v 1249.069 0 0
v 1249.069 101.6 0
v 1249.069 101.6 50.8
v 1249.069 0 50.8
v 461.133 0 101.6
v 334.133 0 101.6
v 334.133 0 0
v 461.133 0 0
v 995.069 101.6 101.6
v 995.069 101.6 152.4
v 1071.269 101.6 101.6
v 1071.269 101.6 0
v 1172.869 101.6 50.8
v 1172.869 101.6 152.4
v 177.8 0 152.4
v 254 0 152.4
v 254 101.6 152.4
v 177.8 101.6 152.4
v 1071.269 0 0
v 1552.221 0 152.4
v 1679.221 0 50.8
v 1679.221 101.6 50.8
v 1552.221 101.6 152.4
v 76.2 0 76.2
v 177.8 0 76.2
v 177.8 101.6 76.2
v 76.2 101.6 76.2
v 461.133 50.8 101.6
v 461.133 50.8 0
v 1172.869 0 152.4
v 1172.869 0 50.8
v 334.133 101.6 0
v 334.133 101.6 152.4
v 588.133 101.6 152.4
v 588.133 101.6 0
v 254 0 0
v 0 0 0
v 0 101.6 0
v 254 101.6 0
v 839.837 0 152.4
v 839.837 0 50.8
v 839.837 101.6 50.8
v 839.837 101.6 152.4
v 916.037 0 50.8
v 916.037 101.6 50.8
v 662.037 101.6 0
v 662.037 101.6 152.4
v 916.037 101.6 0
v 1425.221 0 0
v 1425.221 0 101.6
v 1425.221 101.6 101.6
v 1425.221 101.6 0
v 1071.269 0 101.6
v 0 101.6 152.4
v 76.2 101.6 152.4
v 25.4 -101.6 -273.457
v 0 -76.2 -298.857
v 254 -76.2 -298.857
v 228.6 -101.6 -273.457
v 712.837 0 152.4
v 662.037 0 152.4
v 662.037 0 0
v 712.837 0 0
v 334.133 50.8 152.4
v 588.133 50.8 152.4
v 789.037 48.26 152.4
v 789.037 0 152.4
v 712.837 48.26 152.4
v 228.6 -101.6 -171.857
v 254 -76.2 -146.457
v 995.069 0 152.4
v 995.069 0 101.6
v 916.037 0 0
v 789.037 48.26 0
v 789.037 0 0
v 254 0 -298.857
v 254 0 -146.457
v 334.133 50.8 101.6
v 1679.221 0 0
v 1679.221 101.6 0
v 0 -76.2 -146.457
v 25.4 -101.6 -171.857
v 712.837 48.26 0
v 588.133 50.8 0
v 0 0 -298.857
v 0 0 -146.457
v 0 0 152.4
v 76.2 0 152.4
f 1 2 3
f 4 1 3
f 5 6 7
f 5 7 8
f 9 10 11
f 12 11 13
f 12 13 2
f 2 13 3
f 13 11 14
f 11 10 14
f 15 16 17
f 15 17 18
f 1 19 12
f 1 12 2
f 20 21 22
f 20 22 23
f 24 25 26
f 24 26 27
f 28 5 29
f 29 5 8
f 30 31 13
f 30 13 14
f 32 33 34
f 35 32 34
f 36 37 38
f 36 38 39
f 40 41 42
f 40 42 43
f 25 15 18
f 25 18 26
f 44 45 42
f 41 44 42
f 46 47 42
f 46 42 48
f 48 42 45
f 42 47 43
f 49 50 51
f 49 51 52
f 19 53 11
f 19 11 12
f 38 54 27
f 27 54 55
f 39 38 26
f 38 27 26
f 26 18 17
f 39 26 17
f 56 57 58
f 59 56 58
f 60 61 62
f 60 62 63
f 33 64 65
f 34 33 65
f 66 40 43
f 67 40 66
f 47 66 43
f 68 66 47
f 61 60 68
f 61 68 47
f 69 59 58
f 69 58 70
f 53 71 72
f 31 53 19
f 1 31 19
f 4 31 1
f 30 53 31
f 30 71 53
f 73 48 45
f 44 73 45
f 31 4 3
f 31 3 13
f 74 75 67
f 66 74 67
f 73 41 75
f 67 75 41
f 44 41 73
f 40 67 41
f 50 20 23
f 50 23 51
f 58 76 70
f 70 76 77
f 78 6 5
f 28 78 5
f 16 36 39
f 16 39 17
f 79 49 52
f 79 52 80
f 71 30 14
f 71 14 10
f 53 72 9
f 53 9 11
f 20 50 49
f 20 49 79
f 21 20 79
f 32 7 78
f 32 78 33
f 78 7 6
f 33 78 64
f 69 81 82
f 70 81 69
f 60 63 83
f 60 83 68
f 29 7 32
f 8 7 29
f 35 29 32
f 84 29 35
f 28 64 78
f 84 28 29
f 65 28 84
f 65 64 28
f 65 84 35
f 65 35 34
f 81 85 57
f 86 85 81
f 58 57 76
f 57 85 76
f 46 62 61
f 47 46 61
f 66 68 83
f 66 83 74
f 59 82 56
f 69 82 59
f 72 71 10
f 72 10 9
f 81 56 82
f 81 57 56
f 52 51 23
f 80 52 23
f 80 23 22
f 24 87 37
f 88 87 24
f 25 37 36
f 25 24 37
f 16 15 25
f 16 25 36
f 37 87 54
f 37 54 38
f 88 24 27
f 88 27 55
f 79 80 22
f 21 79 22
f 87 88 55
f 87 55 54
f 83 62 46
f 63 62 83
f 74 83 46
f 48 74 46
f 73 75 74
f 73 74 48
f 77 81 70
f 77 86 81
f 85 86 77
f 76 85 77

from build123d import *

# Parameters (mm, degrees)
F1_DEPTH  = 101.6
F2_W      = 254
F2_H      = 152.4
F3_DEPTH  = 101.6
F5_DEPTH  = 50.8
F6_W      = 50.8
F6_H      = 152.4
F6_W_2    = 76.2
F7_DEPTH  = 101.6
F8_W      = 76.2
F8_H      = 152.4
F9_DEPTH  = 48.26
F11_DEPTH = 101.6
F13_DEPTH = 101.6
F14_W     = 254
F14_H     = 152.4
F15_DEPTH = 101.6
F16_SIZE  = 25.4
F17_SIZE  = 25.4
F18_SIZE  = 25.4
F19_SIZE  = 25.4


with BuildPart() as f1:
    # F0 (on Front) → F1 (new body)
    with BuildSketch(Plane.XZ):
        Polygon((0, 152.4), (0, 0), (254, 0), (254, 152.4), (177.8, 152.4), (177.8, 76.2), (76.2, 76.2), (76.2, 152.4), align=None)
    extrude(amount=-F1_DEPTH)


with BuildPart() as f3:
    # F2 (on Front) → F3 (new body)
    with BuildSketch(Plane.XZ):
        with Locations((461.133139, 76.2)):
            Rectangle(F2_W, F2_H)
    extrude(amount=-F3_DEPTH)

    # F4 (on face) → F5 (cut)
    with BuildSketch(Plane.XZ):
        Polygon((588.133139, 152.4), (334.133139, 152.4), (334.133139, 101.6), (461.133139, 101.6), (461.133139, 0), (588.133139, 0), align=None)
    extrude(amount=-F5_DEPTH, mode=Mode.SUBTRACT)


with BuildPart() as f7:
    # F6 (on Front) → F7 (new body)
    with BuildSketch(Plane.XZ):
        with Locations((687.436573, 76.2)):
            Rectangle(F6_W, F6_H)
        with Locations((750.936573, 76.2)):
            Rectangle(F6_W_2, F6_H)
        Polygon((789.036573, 152.4), (789.036573, 0), (916.036573, 0), (916.036573, 50.8), (839.836573, 50.8), (839.836573, 152.4), align=None)
    extrude(amount=-F7_DEPTH)

    # F8 (on face) → F9 (cut)
    with BuildSketch(Plane.XZ):
        with Locations((750.936573, 76.2)):
            Rectangle(F8_W, F8_H)
    extrude(amount=-F9_DEPTH, mode=Mode.SUBTRACT)


with BuildPart() as f11:
    # F10 (on Front) → F11 (new body)
    with BuildSketch(Plane.XZ):
        Polygon((1071.269111, 101.6), (1071.269111, 0), (1249.069111, 0), (1249.069111, 50.8), (1172.869111, 50.8), (1172.869111, 152.4), (995.069111, 152.4), (995.069111, 101.6), align=None)
    extrude(amount=-F11_DEPTH)


with BuildPart() as f13:
    # F12 (on Front) → F13 (new body)
    with BuildSketch(Plane.XZ):
        Polygon((1425.220926, 101.6), (1425.220926, 0), (1679.220926, 0), (1679.220926, 50.8), (1552.220926, 152.4), align=None)
    extrude(amount=-F13_DEPTH)


with BuildPart() as f15:
    # F14 (on Front) → F15 (new body)
    with BuildSketch(Plane.XZ):
        with Locations((127, -222.656779)):
            Rectangle(F14_W, F14_H)
    extrude(amount=F15_DEPTH)

    # F16
    f16_edges = [f15.edges().sort_by_distance(p)[0] for p in [
        (254, -101.6, -222.656779),
    ]]
    chamfer(f16_edges, length=F16_SIZE)

    # F17
    f17_edges = [f15.edges().sort_by_distance(p)[0] for p in [
        (0, -101.6, -222.656779),
    ]]
    chamfer(f17_edges, length=F17_SIZE)

    # F18
    f18_edges = [f15.edges().sort_by_distance(p)[0] for p in [
        (127, -101.6, -146.456779),
    ]]
    chamfer(f18_edges, length=F18_SIZE)

    # F19
    f19_edges = [f15.edges().sort_by_distance(p)[0] for p in [
        (127, -101.6, -298.856779),
    ]]
    chamfer(f19_edges, length=F19_SIZE)


solid = Compound([f1.part, f3.part, f7.part, f11.part, f13.part, f15.part])
